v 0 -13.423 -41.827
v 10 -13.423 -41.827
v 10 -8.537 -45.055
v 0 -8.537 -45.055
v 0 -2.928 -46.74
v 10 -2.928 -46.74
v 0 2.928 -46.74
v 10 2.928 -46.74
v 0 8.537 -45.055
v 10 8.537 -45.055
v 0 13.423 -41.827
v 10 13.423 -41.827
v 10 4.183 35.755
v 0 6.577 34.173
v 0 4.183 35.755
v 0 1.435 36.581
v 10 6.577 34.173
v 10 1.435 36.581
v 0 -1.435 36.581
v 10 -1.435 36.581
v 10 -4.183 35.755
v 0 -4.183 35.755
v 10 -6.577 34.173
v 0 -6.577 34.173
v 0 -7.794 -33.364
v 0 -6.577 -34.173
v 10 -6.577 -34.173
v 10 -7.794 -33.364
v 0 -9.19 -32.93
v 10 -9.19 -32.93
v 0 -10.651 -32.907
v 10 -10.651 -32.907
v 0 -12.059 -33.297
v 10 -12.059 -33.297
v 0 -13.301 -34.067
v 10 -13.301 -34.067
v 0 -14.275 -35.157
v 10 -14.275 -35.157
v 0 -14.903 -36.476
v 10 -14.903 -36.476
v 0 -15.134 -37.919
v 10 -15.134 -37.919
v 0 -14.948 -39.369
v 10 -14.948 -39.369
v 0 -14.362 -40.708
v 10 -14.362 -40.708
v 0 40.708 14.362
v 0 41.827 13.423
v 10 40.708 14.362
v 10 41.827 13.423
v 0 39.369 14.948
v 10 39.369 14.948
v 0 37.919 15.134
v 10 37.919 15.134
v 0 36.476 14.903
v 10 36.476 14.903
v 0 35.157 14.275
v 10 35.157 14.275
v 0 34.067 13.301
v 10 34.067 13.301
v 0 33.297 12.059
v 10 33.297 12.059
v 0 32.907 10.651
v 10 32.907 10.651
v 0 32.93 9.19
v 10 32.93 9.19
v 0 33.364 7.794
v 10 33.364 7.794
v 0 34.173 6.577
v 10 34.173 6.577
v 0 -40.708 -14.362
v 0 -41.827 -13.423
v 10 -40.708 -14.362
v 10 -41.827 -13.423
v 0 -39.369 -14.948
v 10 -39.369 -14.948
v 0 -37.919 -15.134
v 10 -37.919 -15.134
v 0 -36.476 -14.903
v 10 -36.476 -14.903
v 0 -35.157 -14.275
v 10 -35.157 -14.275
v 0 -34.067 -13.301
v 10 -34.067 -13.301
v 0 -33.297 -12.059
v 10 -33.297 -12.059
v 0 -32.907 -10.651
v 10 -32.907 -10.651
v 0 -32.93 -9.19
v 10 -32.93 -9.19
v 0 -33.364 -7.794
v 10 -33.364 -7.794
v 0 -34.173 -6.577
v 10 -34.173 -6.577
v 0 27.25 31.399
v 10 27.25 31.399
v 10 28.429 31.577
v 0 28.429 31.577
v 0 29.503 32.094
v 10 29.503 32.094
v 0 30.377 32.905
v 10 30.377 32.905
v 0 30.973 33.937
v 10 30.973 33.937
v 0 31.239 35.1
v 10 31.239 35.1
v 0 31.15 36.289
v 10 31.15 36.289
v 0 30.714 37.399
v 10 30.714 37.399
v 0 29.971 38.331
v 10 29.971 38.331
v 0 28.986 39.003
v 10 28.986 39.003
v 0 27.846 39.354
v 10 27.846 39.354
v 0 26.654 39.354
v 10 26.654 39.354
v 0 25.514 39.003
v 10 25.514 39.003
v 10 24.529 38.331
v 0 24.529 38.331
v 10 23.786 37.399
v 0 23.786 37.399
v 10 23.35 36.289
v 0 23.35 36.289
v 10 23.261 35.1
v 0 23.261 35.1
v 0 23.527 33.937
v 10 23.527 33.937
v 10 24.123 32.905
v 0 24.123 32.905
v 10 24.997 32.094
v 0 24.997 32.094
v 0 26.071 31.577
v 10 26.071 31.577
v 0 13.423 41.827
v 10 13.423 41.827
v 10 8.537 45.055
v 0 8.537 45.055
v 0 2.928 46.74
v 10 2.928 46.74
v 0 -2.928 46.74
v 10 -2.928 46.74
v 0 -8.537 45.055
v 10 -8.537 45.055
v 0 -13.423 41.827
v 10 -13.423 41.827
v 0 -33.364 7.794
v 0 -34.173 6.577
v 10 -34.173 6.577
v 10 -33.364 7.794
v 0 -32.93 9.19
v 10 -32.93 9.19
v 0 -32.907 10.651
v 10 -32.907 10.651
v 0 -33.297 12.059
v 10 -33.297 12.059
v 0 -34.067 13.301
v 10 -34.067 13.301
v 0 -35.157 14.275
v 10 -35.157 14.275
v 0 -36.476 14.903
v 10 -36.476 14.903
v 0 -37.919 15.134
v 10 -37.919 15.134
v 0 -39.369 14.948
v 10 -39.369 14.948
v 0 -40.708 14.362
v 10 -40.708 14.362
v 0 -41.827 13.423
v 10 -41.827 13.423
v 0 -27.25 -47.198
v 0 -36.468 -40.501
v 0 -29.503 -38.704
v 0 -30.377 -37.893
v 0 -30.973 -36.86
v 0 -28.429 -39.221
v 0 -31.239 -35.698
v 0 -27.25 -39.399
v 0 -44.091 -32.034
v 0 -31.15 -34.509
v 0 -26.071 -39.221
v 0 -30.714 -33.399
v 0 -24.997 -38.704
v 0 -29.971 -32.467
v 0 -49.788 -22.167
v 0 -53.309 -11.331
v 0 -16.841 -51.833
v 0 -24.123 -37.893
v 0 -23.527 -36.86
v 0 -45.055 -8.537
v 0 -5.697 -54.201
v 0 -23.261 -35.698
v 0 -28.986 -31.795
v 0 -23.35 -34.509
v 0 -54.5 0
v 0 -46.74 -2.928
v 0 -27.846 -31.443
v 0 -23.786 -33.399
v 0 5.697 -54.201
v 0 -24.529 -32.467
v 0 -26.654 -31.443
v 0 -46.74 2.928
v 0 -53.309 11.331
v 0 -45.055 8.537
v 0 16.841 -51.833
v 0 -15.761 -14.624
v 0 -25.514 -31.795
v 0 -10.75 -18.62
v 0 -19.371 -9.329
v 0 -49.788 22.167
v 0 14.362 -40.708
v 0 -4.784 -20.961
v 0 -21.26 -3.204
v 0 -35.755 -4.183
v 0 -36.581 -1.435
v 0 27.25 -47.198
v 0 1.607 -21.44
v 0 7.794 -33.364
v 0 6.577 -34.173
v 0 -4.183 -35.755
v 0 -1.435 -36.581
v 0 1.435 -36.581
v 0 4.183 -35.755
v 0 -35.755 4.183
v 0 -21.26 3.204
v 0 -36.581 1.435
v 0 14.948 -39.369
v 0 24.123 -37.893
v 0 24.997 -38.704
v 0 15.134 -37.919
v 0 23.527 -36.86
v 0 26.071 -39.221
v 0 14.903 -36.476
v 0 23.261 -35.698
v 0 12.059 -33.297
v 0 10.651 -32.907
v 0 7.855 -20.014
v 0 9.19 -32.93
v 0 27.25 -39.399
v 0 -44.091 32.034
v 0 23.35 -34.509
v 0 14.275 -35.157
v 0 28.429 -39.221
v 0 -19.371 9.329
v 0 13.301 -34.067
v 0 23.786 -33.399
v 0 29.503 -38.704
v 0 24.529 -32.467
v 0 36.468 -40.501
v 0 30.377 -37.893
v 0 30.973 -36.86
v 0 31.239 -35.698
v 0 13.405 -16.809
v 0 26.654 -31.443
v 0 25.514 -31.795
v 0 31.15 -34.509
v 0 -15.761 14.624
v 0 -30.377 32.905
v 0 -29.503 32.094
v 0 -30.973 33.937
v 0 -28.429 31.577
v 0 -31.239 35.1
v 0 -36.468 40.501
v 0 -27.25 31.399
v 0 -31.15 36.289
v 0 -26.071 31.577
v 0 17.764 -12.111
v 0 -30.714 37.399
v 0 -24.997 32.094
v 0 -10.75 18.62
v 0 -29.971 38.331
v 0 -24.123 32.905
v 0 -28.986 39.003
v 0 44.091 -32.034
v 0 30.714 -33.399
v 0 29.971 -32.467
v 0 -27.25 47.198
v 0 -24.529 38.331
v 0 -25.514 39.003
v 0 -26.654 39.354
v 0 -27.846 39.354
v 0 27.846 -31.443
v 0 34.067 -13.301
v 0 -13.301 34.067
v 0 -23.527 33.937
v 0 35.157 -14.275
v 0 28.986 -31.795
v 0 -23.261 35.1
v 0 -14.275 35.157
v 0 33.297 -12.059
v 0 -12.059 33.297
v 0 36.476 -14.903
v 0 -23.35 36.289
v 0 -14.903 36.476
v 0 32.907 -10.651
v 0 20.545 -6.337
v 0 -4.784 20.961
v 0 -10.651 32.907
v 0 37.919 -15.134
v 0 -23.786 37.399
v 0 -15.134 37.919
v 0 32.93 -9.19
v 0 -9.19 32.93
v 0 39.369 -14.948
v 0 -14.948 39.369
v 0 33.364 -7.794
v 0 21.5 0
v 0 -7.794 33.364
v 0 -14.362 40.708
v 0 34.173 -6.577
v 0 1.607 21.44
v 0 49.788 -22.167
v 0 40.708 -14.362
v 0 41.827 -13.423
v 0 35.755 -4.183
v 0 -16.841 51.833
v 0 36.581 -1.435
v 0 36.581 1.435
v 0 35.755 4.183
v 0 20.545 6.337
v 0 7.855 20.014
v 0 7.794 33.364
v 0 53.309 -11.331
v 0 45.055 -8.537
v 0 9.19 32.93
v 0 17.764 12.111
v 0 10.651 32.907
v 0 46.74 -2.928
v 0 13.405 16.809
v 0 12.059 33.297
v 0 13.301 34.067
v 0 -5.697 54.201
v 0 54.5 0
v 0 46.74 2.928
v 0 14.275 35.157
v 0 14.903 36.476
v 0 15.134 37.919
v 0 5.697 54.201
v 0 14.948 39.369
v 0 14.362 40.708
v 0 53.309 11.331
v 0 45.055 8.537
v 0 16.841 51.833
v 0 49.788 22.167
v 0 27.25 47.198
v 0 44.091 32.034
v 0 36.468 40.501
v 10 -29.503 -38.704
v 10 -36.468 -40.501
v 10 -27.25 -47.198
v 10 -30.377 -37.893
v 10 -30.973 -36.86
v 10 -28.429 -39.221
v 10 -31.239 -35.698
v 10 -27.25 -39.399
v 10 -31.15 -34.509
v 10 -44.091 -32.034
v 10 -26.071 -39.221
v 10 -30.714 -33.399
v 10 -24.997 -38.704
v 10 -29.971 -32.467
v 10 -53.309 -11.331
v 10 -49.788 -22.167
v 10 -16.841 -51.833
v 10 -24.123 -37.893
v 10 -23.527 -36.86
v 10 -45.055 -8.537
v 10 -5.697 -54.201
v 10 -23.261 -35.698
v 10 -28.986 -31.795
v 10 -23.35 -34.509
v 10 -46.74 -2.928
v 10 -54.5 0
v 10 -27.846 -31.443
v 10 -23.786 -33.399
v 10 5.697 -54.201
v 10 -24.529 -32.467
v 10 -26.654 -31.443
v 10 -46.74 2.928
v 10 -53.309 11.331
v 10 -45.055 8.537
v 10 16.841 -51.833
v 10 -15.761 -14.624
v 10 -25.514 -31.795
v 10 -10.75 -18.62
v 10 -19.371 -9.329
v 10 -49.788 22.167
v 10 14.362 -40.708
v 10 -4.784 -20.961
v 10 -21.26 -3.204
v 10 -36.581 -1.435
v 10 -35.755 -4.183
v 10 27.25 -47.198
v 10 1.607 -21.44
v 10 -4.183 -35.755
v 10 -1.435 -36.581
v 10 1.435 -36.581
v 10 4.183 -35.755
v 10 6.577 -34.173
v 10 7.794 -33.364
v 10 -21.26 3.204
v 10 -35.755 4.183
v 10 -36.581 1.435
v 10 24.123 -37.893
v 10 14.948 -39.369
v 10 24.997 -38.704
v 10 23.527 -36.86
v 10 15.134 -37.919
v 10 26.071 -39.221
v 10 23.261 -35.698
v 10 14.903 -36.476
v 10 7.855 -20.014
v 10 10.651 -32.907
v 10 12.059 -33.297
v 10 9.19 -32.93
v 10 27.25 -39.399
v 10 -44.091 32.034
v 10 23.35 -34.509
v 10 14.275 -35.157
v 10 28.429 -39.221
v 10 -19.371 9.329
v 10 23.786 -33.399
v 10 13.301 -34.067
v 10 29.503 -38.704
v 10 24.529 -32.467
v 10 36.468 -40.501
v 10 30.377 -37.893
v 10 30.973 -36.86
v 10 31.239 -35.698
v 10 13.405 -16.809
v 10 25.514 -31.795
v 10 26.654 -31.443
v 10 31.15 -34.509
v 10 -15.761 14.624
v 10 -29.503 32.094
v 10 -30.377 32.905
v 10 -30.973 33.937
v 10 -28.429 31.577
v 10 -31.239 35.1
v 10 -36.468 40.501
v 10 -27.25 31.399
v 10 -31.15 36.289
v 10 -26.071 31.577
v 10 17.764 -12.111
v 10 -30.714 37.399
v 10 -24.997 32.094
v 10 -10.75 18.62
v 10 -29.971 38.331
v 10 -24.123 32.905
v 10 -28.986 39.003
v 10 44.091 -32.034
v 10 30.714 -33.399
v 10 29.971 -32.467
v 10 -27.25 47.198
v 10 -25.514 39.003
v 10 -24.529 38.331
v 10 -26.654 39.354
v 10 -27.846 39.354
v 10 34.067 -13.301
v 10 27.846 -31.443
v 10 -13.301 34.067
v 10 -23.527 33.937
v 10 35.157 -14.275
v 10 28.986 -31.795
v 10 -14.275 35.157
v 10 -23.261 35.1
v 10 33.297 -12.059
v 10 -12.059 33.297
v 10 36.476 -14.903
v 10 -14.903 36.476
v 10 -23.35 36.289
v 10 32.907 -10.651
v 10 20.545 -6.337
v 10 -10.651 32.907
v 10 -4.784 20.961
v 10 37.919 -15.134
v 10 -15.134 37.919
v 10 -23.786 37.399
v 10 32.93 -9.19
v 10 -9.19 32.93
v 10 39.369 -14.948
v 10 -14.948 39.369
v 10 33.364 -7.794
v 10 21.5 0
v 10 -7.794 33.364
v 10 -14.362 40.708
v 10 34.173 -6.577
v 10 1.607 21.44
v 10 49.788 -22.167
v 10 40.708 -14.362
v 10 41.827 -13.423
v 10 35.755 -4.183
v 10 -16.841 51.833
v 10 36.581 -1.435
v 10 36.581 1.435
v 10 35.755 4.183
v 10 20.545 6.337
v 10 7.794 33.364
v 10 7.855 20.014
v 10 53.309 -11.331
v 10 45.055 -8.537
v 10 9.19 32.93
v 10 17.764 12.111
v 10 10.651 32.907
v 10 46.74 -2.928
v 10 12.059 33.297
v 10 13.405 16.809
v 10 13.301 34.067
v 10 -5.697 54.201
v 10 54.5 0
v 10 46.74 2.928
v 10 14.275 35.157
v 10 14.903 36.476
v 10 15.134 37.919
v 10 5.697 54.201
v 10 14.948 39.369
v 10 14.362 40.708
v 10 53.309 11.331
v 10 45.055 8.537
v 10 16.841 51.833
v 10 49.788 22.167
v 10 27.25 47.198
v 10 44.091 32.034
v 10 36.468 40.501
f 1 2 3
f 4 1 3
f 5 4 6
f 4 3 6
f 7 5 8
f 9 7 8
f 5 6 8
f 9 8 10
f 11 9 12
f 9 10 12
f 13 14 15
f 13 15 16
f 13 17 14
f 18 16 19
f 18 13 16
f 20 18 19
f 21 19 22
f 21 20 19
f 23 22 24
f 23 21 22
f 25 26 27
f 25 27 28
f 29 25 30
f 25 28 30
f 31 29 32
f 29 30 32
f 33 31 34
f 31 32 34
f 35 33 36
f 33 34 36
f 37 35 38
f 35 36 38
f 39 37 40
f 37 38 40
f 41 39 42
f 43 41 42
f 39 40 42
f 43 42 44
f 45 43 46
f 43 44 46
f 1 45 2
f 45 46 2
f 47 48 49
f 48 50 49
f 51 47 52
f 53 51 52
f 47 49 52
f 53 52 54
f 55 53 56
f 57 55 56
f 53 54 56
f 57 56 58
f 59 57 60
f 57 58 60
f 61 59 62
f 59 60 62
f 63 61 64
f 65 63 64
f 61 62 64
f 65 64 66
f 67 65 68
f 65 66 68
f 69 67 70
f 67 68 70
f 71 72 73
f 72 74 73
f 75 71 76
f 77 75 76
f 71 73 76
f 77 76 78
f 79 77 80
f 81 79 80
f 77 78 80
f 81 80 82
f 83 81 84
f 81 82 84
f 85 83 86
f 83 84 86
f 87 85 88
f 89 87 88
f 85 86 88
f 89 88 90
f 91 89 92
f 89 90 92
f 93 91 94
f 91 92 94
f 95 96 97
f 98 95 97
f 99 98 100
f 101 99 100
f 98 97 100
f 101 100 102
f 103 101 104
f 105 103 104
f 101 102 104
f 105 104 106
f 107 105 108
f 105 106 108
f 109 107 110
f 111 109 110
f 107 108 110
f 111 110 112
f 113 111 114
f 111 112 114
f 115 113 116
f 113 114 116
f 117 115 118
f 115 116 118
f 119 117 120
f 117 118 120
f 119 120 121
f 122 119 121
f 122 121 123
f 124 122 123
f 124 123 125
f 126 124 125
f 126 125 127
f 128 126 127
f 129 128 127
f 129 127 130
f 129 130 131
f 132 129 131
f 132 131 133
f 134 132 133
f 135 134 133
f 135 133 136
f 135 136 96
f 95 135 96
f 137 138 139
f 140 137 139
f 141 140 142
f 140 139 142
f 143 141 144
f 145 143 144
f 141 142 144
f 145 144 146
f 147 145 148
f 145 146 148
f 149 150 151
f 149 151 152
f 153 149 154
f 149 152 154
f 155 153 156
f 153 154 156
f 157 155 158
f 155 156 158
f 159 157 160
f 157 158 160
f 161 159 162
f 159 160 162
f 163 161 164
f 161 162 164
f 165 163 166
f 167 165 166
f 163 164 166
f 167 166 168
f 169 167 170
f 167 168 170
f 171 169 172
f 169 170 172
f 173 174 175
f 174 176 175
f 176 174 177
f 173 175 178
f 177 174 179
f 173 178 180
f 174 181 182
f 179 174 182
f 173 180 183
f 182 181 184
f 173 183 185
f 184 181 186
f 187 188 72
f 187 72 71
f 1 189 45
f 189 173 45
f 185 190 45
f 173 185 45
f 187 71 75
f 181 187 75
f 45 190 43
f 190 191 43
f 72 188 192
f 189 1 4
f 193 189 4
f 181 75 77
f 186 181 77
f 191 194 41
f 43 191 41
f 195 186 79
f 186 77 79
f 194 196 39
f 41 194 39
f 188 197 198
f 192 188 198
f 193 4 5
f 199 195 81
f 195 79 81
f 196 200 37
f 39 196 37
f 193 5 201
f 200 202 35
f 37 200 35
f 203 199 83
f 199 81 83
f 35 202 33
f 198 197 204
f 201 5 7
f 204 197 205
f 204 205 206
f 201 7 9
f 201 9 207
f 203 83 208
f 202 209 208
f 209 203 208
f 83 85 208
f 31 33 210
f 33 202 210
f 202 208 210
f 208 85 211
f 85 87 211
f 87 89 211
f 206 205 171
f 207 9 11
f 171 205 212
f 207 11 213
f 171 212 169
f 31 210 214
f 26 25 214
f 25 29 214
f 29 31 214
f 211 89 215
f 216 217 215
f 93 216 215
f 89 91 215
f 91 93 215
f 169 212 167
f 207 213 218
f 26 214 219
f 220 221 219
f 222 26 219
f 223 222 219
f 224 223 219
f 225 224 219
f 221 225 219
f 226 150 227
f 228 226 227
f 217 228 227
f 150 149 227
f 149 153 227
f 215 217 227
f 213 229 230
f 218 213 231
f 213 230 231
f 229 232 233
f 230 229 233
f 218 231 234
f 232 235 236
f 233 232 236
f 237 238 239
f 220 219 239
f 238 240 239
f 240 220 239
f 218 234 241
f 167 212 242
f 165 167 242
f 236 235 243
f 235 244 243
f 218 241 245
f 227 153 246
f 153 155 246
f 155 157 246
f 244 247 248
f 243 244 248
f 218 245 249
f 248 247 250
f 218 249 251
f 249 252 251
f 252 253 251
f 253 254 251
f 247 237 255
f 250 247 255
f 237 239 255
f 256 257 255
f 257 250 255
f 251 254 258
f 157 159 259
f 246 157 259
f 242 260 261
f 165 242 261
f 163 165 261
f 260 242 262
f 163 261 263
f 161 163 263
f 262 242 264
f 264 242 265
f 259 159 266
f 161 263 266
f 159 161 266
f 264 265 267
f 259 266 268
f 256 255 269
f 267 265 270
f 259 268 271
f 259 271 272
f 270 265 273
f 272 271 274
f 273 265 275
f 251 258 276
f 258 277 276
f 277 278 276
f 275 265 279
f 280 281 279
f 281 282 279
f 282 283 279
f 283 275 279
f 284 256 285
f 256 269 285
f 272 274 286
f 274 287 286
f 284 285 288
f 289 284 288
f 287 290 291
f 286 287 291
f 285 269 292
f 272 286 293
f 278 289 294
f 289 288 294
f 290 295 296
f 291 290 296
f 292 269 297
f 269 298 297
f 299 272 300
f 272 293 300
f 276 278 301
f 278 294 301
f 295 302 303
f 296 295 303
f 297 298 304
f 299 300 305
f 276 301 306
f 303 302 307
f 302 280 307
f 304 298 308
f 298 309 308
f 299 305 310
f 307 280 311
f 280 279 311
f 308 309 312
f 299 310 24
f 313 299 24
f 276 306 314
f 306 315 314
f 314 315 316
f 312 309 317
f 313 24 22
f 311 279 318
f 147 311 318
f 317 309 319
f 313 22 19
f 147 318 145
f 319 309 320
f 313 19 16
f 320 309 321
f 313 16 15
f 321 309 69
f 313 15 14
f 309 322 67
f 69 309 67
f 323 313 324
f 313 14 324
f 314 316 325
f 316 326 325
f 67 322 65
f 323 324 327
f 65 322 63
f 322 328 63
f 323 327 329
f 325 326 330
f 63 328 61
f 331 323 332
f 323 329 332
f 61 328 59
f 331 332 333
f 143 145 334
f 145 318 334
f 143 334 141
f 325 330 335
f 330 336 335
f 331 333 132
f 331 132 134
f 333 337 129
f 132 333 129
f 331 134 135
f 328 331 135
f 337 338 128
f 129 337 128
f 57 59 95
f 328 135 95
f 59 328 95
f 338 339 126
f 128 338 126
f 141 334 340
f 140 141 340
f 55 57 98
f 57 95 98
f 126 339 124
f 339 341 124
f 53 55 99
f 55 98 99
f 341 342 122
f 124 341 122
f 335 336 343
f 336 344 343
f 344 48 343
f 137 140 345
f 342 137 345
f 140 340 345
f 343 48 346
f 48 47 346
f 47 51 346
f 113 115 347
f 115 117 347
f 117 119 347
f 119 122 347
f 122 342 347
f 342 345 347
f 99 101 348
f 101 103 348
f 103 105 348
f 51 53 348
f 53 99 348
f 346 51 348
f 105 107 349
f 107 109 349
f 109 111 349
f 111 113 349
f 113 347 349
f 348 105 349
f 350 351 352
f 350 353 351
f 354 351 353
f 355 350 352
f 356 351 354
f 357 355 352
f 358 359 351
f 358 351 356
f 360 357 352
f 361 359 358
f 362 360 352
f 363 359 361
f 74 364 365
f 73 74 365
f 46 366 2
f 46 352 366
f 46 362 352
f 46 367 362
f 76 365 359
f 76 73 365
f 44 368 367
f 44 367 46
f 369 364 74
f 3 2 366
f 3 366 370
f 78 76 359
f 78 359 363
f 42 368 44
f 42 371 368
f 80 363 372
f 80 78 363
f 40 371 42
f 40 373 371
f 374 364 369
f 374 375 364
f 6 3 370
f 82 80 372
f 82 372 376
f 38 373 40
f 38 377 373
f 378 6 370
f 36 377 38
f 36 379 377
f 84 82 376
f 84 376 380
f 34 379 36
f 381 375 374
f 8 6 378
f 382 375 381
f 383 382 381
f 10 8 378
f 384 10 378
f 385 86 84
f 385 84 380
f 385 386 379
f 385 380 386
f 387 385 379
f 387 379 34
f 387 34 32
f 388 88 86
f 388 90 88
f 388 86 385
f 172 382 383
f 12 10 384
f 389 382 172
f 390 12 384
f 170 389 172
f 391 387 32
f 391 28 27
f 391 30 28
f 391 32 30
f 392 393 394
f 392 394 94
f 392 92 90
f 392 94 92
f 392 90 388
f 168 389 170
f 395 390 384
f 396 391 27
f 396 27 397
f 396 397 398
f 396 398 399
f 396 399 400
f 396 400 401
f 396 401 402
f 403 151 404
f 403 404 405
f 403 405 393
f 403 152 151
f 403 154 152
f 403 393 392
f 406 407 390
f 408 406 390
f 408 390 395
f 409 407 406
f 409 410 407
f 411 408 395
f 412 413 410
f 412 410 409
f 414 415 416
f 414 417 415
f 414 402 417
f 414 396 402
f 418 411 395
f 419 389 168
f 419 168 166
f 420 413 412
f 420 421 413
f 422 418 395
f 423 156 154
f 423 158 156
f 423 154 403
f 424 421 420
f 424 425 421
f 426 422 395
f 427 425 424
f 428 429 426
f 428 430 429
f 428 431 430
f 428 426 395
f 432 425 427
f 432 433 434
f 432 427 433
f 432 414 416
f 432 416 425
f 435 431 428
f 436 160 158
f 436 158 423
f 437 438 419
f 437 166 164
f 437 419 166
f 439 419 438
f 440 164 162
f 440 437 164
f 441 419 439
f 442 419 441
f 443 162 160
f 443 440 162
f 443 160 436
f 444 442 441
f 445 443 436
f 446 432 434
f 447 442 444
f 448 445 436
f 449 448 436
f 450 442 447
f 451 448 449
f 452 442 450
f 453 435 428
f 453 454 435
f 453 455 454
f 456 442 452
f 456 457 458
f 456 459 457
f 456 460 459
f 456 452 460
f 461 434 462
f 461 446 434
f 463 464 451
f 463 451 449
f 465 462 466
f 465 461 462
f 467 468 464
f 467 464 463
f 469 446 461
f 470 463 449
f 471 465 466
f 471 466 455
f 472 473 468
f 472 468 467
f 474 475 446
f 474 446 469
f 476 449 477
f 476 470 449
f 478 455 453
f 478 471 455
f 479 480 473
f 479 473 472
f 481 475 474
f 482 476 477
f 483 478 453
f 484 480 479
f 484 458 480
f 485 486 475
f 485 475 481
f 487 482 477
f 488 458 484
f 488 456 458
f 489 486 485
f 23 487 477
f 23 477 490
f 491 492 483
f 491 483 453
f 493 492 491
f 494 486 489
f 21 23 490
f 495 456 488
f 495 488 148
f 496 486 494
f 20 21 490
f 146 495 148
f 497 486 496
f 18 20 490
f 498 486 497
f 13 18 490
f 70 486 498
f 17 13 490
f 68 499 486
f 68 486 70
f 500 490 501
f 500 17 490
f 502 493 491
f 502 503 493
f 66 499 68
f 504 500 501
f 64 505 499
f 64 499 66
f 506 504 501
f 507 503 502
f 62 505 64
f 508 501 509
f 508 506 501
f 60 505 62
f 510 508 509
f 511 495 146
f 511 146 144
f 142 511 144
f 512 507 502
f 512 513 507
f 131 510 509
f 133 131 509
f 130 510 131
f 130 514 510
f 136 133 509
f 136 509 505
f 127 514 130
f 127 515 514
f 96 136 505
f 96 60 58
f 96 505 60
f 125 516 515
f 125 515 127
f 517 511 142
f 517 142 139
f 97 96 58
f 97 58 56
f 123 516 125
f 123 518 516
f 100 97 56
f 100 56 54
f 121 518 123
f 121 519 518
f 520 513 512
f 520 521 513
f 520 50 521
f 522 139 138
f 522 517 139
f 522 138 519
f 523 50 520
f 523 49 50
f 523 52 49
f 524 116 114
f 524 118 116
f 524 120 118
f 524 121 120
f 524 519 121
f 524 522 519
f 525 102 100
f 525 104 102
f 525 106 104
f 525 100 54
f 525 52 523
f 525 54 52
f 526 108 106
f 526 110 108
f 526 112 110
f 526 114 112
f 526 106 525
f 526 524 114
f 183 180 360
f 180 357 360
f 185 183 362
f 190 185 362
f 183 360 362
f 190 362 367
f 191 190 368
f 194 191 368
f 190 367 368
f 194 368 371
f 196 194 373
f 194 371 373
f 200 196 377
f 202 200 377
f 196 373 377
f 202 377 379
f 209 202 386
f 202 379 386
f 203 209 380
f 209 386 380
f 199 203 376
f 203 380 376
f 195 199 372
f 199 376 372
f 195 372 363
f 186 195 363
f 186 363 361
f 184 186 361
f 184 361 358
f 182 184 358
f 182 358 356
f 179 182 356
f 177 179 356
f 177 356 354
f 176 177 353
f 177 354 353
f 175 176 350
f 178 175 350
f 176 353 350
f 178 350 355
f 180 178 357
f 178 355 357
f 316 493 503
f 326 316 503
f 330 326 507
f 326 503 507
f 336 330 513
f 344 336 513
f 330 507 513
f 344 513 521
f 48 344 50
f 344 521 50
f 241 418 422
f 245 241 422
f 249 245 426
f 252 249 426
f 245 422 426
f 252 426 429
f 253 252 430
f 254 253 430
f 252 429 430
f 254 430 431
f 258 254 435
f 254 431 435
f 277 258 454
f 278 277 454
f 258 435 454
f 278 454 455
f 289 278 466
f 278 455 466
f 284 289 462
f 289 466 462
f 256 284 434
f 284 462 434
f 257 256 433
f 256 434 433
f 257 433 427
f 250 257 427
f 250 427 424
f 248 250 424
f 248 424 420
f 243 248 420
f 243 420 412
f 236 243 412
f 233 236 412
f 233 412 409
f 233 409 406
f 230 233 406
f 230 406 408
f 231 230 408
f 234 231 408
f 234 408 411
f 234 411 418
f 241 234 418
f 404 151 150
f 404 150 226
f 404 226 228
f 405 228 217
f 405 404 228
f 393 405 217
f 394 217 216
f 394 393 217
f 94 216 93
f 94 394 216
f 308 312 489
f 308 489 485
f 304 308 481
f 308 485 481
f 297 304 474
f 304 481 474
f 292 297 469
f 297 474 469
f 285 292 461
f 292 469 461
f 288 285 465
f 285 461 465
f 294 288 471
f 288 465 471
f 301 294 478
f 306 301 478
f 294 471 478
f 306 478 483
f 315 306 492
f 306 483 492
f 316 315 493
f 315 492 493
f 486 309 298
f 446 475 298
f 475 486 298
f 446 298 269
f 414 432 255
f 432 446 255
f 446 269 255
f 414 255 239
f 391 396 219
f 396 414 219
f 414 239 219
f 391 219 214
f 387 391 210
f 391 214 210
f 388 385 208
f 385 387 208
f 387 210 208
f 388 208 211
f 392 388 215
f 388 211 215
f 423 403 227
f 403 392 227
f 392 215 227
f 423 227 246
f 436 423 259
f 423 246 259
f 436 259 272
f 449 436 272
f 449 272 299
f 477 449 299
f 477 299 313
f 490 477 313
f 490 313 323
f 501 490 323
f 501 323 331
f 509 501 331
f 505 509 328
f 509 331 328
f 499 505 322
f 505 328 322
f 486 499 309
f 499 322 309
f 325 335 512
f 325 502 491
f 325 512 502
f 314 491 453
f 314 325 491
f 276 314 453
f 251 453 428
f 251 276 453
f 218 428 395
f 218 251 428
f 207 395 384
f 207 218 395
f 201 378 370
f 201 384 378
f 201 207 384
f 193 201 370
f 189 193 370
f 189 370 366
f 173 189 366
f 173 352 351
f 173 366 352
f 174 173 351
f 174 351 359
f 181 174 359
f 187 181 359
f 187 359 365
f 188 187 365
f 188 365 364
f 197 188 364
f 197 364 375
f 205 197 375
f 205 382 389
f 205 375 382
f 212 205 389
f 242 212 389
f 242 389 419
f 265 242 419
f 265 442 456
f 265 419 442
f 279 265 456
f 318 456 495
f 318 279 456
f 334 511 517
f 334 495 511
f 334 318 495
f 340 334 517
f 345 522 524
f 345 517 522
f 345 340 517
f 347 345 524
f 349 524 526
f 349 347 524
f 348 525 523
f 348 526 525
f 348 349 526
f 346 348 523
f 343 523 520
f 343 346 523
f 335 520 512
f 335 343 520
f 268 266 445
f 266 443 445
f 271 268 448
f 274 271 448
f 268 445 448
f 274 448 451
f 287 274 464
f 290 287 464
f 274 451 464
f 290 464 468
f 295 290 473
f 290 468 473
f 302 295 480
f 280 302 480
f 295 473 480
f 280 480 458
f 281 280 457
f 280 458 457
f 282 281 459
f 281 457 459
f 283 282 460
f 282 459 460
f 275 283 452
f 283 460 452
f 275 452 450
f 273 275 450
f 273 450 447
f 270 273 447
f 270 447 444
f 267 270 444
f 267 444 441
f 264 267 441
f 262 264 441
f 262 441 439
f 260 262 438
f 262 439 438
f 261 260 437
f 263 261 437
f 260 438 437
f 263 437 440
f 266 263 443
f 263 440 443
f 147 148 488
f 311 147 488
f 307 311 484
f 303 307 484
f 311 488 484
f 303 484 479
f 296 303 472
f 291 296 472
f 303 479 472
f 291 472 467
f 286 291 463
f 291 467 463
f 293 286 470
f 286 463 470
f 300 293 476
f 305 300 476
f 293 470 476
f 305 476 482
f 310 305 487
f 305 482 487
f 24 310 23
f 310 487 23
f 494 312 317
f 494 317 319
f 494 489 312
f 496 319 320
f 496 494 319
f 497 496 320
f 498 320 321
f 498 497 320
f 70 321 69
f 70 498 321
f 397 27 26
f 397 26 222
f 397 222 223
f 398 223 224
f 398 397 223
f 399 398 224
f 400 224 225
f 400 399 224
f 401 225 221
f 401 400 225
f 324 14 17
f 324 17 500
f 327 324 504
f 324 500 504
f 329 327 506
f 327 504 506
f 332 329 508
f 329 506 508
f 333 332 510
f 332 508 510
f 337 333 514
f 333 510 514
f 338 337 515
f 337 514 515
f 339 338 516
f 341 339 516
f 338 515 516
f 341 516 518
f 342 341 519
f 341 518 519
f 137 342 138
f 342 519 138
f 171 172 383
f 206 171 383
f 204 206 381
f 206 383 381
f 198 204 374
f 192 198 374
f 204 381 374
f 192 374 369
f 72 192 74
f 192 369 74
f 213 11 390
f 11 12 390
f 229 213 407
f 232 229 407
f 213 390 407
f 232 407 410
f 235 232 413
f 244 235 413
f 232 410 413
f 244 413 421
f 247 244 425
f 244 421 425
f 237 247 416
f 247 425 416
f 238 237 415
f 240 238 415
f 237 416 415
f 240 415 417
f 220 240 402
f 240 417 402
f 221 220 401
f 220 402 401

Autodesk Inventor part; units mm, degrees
ref_plane "YZ Plane" through (0, 0, 0) normal (1, 0, 0) x (0, 1, 0)
ref_plane "XZ Plane" through (0, 0, 0) normal (0, 1, 0) x (-1, 0, 0)
ref_plane "XY Plane" through (0, 0, 0) normal (0, 0, 1) x (1, 0, 0)
sketch "Sketch2" plane through (0, 0, 0) normal (1, 0, 0) x (0, 1, 0)
  circle A0 centre (0, 0) radius 54.5
  circle A1 centre (-27.25, -35.3988) radius 3.5
  circle A2 centre (-27.25, 35.3988) radius 3.5
  circle A3 centre (27.25, -35.3988) radius 3.5
  circle A4 centre (27.25, 35.3988) radius 3.5
  circle A5 centre (0, 0) radius 21.5
extrude "Extrusion4" add sketch "Sketch2" along normal blind 10
sketch "Sketch4" plane through (10, 0, 0) normal (1, 0, 0) x (0, 0, -1)
  circle A0 centre (0, 0) radius 54.5 projected
  circle A1 centre (0, 0) radius 21.5 projected
  arc A2 (10, 38) -> (-10, 38) centre (0, 26.8197) ccw construction
  arc A3 (13.4228, 41.8269) -> (-13.4228, 41.8269) centre (0, 26.8197) ccw
  arc A4 (6.5772, 34.1731) -> (-6.5772, 34.1731) centre (0, 26.8197) ccw
  arc A5 (6.5772, 34.1731) -> (13.4228, 41.8269) centre (10, 38) ccw
  arc A6 (-13.4228, 41.8269) -> (-6.5772, 34.1731) centre (-10, 38) ccw
  dimension "d28" = 15
extrude "Extrusion5" cut sketch "Sketch4" against normal blind 10 contours A5 A4 A6 A3
pattern_circular "Circular Pattern2" count 4 over 360 about axis through (0, 0, 0) along (1, 0, 0) of "Extrusion5"
sketch "Sketch5" plane through (10, 0, 0) normal (1, 0, 0) x (0, 0, -1)
  arc A0 (41.8269, 13.4228) -> (34.1731, 6.5772) centre (38, 10) ccw projected
  arc A1 (41.8269, -13.4228) -> (41.8269, 13.4228) centre (26.8197, 0) ccw projected
  arc A2 (34.1731, -6.5772) -> (41.8269, -13.4228) centre (38, -10) ccw projected
  arc A3 (34.1731, -6.5772) -> (34.1731, 6.5772) centre (26.8197, 0) ccw projected
  arc A4 (13.4228, -41.8269) -> (6.5772, -34.1731) centre (10, -38) ccw projected
  arc A5 (-13.4228, -41.8269) -> (13.4228, -41.8269) centre (0, -26.8197) ccw projected
  arc A6 (-6.5772, -34.1731) -> (-13.4228, -41.8269) centre (-10, -38) ccw projected
  arc A7 (-6.5772, -34.1731) -> (6.5772, -34.1731) centre (0, -26.8197) ccw projected
  arc A8 (-41.8269, -13.4228) -> (-34.1731, -6.5772) centre (-38, -10) ccw projected
  arc A9 (-41.8269, 13.4228) -> (-41.8269, -13.4228) centre (-26.8197, 0) ccw projected
  arc A10 (-34.1731, 6.5772) -> (-41.8269, 13.4228) centre (-38, 10) ccw projected
  arc A11 (-34.1731, 6.5772) -> (-34.1731, -6.5772) centre (-26.8197, 0) ccw projected
  arc A12 (-13.4228, 41.8269) -> (-6.5772, 34.1731) centre (-10, 38) ccw projected
  arc A13 (13.4228, 41.8269) -> (-13.4228, 41.8269) centre (0, 26.8197) ccw projected
  arc A14 (6.5772, 34.1731) -> (13.4228, 41.8269) centre (10, 38) ccw projected
  arc A15 (6.5772, 34.1731) -> (-6.5772, 34.1731) centre (0, 26.8197) ccw projected
  circle A16 centre (0, 0) radius 21.5 projected
  circle A17 centre (35.3988, 27.25) radius 3.5 projected
  circle A18 centre (-35.3988, 27.25) radius 3.5 projected
  circle A19 centre (-35.3988, -27.25) radius 3.5 projected
  circle A20 centre (35.3988, -27.25) radius 3.5 projected
  circle A21 centre (0, 0) radius 54.5 projected
sketch "Sketch6" plane through (10, 0, 0) normal (1, 0, 0) x (0, 0, -1)
  circle A0 centre (-35.3988, 27.25) radius 3.5 projected
  circle A1 centre (35.3988, 27.25) radius 3.5 projected
  circle A2 centre (-35.3988, -27.25) radius 3.5 projected
  circle A3 centre (35.3988, -27.25) radius 3.5 projected
  circle A4 centre (-35.3988, 27.25) radius 4
  circle A5 centre (35.3988, 27.25) radius 4
  circle A6 centre (-35.3988, -27.25) radius 4
  circle A7 centre (35.3988, -27.25) radius 4
  point P0 (0, 0)
extrude "Extrusion6" cut sketch "Sketch6" against normal blind 10
properties part number "ballast_tutup"
